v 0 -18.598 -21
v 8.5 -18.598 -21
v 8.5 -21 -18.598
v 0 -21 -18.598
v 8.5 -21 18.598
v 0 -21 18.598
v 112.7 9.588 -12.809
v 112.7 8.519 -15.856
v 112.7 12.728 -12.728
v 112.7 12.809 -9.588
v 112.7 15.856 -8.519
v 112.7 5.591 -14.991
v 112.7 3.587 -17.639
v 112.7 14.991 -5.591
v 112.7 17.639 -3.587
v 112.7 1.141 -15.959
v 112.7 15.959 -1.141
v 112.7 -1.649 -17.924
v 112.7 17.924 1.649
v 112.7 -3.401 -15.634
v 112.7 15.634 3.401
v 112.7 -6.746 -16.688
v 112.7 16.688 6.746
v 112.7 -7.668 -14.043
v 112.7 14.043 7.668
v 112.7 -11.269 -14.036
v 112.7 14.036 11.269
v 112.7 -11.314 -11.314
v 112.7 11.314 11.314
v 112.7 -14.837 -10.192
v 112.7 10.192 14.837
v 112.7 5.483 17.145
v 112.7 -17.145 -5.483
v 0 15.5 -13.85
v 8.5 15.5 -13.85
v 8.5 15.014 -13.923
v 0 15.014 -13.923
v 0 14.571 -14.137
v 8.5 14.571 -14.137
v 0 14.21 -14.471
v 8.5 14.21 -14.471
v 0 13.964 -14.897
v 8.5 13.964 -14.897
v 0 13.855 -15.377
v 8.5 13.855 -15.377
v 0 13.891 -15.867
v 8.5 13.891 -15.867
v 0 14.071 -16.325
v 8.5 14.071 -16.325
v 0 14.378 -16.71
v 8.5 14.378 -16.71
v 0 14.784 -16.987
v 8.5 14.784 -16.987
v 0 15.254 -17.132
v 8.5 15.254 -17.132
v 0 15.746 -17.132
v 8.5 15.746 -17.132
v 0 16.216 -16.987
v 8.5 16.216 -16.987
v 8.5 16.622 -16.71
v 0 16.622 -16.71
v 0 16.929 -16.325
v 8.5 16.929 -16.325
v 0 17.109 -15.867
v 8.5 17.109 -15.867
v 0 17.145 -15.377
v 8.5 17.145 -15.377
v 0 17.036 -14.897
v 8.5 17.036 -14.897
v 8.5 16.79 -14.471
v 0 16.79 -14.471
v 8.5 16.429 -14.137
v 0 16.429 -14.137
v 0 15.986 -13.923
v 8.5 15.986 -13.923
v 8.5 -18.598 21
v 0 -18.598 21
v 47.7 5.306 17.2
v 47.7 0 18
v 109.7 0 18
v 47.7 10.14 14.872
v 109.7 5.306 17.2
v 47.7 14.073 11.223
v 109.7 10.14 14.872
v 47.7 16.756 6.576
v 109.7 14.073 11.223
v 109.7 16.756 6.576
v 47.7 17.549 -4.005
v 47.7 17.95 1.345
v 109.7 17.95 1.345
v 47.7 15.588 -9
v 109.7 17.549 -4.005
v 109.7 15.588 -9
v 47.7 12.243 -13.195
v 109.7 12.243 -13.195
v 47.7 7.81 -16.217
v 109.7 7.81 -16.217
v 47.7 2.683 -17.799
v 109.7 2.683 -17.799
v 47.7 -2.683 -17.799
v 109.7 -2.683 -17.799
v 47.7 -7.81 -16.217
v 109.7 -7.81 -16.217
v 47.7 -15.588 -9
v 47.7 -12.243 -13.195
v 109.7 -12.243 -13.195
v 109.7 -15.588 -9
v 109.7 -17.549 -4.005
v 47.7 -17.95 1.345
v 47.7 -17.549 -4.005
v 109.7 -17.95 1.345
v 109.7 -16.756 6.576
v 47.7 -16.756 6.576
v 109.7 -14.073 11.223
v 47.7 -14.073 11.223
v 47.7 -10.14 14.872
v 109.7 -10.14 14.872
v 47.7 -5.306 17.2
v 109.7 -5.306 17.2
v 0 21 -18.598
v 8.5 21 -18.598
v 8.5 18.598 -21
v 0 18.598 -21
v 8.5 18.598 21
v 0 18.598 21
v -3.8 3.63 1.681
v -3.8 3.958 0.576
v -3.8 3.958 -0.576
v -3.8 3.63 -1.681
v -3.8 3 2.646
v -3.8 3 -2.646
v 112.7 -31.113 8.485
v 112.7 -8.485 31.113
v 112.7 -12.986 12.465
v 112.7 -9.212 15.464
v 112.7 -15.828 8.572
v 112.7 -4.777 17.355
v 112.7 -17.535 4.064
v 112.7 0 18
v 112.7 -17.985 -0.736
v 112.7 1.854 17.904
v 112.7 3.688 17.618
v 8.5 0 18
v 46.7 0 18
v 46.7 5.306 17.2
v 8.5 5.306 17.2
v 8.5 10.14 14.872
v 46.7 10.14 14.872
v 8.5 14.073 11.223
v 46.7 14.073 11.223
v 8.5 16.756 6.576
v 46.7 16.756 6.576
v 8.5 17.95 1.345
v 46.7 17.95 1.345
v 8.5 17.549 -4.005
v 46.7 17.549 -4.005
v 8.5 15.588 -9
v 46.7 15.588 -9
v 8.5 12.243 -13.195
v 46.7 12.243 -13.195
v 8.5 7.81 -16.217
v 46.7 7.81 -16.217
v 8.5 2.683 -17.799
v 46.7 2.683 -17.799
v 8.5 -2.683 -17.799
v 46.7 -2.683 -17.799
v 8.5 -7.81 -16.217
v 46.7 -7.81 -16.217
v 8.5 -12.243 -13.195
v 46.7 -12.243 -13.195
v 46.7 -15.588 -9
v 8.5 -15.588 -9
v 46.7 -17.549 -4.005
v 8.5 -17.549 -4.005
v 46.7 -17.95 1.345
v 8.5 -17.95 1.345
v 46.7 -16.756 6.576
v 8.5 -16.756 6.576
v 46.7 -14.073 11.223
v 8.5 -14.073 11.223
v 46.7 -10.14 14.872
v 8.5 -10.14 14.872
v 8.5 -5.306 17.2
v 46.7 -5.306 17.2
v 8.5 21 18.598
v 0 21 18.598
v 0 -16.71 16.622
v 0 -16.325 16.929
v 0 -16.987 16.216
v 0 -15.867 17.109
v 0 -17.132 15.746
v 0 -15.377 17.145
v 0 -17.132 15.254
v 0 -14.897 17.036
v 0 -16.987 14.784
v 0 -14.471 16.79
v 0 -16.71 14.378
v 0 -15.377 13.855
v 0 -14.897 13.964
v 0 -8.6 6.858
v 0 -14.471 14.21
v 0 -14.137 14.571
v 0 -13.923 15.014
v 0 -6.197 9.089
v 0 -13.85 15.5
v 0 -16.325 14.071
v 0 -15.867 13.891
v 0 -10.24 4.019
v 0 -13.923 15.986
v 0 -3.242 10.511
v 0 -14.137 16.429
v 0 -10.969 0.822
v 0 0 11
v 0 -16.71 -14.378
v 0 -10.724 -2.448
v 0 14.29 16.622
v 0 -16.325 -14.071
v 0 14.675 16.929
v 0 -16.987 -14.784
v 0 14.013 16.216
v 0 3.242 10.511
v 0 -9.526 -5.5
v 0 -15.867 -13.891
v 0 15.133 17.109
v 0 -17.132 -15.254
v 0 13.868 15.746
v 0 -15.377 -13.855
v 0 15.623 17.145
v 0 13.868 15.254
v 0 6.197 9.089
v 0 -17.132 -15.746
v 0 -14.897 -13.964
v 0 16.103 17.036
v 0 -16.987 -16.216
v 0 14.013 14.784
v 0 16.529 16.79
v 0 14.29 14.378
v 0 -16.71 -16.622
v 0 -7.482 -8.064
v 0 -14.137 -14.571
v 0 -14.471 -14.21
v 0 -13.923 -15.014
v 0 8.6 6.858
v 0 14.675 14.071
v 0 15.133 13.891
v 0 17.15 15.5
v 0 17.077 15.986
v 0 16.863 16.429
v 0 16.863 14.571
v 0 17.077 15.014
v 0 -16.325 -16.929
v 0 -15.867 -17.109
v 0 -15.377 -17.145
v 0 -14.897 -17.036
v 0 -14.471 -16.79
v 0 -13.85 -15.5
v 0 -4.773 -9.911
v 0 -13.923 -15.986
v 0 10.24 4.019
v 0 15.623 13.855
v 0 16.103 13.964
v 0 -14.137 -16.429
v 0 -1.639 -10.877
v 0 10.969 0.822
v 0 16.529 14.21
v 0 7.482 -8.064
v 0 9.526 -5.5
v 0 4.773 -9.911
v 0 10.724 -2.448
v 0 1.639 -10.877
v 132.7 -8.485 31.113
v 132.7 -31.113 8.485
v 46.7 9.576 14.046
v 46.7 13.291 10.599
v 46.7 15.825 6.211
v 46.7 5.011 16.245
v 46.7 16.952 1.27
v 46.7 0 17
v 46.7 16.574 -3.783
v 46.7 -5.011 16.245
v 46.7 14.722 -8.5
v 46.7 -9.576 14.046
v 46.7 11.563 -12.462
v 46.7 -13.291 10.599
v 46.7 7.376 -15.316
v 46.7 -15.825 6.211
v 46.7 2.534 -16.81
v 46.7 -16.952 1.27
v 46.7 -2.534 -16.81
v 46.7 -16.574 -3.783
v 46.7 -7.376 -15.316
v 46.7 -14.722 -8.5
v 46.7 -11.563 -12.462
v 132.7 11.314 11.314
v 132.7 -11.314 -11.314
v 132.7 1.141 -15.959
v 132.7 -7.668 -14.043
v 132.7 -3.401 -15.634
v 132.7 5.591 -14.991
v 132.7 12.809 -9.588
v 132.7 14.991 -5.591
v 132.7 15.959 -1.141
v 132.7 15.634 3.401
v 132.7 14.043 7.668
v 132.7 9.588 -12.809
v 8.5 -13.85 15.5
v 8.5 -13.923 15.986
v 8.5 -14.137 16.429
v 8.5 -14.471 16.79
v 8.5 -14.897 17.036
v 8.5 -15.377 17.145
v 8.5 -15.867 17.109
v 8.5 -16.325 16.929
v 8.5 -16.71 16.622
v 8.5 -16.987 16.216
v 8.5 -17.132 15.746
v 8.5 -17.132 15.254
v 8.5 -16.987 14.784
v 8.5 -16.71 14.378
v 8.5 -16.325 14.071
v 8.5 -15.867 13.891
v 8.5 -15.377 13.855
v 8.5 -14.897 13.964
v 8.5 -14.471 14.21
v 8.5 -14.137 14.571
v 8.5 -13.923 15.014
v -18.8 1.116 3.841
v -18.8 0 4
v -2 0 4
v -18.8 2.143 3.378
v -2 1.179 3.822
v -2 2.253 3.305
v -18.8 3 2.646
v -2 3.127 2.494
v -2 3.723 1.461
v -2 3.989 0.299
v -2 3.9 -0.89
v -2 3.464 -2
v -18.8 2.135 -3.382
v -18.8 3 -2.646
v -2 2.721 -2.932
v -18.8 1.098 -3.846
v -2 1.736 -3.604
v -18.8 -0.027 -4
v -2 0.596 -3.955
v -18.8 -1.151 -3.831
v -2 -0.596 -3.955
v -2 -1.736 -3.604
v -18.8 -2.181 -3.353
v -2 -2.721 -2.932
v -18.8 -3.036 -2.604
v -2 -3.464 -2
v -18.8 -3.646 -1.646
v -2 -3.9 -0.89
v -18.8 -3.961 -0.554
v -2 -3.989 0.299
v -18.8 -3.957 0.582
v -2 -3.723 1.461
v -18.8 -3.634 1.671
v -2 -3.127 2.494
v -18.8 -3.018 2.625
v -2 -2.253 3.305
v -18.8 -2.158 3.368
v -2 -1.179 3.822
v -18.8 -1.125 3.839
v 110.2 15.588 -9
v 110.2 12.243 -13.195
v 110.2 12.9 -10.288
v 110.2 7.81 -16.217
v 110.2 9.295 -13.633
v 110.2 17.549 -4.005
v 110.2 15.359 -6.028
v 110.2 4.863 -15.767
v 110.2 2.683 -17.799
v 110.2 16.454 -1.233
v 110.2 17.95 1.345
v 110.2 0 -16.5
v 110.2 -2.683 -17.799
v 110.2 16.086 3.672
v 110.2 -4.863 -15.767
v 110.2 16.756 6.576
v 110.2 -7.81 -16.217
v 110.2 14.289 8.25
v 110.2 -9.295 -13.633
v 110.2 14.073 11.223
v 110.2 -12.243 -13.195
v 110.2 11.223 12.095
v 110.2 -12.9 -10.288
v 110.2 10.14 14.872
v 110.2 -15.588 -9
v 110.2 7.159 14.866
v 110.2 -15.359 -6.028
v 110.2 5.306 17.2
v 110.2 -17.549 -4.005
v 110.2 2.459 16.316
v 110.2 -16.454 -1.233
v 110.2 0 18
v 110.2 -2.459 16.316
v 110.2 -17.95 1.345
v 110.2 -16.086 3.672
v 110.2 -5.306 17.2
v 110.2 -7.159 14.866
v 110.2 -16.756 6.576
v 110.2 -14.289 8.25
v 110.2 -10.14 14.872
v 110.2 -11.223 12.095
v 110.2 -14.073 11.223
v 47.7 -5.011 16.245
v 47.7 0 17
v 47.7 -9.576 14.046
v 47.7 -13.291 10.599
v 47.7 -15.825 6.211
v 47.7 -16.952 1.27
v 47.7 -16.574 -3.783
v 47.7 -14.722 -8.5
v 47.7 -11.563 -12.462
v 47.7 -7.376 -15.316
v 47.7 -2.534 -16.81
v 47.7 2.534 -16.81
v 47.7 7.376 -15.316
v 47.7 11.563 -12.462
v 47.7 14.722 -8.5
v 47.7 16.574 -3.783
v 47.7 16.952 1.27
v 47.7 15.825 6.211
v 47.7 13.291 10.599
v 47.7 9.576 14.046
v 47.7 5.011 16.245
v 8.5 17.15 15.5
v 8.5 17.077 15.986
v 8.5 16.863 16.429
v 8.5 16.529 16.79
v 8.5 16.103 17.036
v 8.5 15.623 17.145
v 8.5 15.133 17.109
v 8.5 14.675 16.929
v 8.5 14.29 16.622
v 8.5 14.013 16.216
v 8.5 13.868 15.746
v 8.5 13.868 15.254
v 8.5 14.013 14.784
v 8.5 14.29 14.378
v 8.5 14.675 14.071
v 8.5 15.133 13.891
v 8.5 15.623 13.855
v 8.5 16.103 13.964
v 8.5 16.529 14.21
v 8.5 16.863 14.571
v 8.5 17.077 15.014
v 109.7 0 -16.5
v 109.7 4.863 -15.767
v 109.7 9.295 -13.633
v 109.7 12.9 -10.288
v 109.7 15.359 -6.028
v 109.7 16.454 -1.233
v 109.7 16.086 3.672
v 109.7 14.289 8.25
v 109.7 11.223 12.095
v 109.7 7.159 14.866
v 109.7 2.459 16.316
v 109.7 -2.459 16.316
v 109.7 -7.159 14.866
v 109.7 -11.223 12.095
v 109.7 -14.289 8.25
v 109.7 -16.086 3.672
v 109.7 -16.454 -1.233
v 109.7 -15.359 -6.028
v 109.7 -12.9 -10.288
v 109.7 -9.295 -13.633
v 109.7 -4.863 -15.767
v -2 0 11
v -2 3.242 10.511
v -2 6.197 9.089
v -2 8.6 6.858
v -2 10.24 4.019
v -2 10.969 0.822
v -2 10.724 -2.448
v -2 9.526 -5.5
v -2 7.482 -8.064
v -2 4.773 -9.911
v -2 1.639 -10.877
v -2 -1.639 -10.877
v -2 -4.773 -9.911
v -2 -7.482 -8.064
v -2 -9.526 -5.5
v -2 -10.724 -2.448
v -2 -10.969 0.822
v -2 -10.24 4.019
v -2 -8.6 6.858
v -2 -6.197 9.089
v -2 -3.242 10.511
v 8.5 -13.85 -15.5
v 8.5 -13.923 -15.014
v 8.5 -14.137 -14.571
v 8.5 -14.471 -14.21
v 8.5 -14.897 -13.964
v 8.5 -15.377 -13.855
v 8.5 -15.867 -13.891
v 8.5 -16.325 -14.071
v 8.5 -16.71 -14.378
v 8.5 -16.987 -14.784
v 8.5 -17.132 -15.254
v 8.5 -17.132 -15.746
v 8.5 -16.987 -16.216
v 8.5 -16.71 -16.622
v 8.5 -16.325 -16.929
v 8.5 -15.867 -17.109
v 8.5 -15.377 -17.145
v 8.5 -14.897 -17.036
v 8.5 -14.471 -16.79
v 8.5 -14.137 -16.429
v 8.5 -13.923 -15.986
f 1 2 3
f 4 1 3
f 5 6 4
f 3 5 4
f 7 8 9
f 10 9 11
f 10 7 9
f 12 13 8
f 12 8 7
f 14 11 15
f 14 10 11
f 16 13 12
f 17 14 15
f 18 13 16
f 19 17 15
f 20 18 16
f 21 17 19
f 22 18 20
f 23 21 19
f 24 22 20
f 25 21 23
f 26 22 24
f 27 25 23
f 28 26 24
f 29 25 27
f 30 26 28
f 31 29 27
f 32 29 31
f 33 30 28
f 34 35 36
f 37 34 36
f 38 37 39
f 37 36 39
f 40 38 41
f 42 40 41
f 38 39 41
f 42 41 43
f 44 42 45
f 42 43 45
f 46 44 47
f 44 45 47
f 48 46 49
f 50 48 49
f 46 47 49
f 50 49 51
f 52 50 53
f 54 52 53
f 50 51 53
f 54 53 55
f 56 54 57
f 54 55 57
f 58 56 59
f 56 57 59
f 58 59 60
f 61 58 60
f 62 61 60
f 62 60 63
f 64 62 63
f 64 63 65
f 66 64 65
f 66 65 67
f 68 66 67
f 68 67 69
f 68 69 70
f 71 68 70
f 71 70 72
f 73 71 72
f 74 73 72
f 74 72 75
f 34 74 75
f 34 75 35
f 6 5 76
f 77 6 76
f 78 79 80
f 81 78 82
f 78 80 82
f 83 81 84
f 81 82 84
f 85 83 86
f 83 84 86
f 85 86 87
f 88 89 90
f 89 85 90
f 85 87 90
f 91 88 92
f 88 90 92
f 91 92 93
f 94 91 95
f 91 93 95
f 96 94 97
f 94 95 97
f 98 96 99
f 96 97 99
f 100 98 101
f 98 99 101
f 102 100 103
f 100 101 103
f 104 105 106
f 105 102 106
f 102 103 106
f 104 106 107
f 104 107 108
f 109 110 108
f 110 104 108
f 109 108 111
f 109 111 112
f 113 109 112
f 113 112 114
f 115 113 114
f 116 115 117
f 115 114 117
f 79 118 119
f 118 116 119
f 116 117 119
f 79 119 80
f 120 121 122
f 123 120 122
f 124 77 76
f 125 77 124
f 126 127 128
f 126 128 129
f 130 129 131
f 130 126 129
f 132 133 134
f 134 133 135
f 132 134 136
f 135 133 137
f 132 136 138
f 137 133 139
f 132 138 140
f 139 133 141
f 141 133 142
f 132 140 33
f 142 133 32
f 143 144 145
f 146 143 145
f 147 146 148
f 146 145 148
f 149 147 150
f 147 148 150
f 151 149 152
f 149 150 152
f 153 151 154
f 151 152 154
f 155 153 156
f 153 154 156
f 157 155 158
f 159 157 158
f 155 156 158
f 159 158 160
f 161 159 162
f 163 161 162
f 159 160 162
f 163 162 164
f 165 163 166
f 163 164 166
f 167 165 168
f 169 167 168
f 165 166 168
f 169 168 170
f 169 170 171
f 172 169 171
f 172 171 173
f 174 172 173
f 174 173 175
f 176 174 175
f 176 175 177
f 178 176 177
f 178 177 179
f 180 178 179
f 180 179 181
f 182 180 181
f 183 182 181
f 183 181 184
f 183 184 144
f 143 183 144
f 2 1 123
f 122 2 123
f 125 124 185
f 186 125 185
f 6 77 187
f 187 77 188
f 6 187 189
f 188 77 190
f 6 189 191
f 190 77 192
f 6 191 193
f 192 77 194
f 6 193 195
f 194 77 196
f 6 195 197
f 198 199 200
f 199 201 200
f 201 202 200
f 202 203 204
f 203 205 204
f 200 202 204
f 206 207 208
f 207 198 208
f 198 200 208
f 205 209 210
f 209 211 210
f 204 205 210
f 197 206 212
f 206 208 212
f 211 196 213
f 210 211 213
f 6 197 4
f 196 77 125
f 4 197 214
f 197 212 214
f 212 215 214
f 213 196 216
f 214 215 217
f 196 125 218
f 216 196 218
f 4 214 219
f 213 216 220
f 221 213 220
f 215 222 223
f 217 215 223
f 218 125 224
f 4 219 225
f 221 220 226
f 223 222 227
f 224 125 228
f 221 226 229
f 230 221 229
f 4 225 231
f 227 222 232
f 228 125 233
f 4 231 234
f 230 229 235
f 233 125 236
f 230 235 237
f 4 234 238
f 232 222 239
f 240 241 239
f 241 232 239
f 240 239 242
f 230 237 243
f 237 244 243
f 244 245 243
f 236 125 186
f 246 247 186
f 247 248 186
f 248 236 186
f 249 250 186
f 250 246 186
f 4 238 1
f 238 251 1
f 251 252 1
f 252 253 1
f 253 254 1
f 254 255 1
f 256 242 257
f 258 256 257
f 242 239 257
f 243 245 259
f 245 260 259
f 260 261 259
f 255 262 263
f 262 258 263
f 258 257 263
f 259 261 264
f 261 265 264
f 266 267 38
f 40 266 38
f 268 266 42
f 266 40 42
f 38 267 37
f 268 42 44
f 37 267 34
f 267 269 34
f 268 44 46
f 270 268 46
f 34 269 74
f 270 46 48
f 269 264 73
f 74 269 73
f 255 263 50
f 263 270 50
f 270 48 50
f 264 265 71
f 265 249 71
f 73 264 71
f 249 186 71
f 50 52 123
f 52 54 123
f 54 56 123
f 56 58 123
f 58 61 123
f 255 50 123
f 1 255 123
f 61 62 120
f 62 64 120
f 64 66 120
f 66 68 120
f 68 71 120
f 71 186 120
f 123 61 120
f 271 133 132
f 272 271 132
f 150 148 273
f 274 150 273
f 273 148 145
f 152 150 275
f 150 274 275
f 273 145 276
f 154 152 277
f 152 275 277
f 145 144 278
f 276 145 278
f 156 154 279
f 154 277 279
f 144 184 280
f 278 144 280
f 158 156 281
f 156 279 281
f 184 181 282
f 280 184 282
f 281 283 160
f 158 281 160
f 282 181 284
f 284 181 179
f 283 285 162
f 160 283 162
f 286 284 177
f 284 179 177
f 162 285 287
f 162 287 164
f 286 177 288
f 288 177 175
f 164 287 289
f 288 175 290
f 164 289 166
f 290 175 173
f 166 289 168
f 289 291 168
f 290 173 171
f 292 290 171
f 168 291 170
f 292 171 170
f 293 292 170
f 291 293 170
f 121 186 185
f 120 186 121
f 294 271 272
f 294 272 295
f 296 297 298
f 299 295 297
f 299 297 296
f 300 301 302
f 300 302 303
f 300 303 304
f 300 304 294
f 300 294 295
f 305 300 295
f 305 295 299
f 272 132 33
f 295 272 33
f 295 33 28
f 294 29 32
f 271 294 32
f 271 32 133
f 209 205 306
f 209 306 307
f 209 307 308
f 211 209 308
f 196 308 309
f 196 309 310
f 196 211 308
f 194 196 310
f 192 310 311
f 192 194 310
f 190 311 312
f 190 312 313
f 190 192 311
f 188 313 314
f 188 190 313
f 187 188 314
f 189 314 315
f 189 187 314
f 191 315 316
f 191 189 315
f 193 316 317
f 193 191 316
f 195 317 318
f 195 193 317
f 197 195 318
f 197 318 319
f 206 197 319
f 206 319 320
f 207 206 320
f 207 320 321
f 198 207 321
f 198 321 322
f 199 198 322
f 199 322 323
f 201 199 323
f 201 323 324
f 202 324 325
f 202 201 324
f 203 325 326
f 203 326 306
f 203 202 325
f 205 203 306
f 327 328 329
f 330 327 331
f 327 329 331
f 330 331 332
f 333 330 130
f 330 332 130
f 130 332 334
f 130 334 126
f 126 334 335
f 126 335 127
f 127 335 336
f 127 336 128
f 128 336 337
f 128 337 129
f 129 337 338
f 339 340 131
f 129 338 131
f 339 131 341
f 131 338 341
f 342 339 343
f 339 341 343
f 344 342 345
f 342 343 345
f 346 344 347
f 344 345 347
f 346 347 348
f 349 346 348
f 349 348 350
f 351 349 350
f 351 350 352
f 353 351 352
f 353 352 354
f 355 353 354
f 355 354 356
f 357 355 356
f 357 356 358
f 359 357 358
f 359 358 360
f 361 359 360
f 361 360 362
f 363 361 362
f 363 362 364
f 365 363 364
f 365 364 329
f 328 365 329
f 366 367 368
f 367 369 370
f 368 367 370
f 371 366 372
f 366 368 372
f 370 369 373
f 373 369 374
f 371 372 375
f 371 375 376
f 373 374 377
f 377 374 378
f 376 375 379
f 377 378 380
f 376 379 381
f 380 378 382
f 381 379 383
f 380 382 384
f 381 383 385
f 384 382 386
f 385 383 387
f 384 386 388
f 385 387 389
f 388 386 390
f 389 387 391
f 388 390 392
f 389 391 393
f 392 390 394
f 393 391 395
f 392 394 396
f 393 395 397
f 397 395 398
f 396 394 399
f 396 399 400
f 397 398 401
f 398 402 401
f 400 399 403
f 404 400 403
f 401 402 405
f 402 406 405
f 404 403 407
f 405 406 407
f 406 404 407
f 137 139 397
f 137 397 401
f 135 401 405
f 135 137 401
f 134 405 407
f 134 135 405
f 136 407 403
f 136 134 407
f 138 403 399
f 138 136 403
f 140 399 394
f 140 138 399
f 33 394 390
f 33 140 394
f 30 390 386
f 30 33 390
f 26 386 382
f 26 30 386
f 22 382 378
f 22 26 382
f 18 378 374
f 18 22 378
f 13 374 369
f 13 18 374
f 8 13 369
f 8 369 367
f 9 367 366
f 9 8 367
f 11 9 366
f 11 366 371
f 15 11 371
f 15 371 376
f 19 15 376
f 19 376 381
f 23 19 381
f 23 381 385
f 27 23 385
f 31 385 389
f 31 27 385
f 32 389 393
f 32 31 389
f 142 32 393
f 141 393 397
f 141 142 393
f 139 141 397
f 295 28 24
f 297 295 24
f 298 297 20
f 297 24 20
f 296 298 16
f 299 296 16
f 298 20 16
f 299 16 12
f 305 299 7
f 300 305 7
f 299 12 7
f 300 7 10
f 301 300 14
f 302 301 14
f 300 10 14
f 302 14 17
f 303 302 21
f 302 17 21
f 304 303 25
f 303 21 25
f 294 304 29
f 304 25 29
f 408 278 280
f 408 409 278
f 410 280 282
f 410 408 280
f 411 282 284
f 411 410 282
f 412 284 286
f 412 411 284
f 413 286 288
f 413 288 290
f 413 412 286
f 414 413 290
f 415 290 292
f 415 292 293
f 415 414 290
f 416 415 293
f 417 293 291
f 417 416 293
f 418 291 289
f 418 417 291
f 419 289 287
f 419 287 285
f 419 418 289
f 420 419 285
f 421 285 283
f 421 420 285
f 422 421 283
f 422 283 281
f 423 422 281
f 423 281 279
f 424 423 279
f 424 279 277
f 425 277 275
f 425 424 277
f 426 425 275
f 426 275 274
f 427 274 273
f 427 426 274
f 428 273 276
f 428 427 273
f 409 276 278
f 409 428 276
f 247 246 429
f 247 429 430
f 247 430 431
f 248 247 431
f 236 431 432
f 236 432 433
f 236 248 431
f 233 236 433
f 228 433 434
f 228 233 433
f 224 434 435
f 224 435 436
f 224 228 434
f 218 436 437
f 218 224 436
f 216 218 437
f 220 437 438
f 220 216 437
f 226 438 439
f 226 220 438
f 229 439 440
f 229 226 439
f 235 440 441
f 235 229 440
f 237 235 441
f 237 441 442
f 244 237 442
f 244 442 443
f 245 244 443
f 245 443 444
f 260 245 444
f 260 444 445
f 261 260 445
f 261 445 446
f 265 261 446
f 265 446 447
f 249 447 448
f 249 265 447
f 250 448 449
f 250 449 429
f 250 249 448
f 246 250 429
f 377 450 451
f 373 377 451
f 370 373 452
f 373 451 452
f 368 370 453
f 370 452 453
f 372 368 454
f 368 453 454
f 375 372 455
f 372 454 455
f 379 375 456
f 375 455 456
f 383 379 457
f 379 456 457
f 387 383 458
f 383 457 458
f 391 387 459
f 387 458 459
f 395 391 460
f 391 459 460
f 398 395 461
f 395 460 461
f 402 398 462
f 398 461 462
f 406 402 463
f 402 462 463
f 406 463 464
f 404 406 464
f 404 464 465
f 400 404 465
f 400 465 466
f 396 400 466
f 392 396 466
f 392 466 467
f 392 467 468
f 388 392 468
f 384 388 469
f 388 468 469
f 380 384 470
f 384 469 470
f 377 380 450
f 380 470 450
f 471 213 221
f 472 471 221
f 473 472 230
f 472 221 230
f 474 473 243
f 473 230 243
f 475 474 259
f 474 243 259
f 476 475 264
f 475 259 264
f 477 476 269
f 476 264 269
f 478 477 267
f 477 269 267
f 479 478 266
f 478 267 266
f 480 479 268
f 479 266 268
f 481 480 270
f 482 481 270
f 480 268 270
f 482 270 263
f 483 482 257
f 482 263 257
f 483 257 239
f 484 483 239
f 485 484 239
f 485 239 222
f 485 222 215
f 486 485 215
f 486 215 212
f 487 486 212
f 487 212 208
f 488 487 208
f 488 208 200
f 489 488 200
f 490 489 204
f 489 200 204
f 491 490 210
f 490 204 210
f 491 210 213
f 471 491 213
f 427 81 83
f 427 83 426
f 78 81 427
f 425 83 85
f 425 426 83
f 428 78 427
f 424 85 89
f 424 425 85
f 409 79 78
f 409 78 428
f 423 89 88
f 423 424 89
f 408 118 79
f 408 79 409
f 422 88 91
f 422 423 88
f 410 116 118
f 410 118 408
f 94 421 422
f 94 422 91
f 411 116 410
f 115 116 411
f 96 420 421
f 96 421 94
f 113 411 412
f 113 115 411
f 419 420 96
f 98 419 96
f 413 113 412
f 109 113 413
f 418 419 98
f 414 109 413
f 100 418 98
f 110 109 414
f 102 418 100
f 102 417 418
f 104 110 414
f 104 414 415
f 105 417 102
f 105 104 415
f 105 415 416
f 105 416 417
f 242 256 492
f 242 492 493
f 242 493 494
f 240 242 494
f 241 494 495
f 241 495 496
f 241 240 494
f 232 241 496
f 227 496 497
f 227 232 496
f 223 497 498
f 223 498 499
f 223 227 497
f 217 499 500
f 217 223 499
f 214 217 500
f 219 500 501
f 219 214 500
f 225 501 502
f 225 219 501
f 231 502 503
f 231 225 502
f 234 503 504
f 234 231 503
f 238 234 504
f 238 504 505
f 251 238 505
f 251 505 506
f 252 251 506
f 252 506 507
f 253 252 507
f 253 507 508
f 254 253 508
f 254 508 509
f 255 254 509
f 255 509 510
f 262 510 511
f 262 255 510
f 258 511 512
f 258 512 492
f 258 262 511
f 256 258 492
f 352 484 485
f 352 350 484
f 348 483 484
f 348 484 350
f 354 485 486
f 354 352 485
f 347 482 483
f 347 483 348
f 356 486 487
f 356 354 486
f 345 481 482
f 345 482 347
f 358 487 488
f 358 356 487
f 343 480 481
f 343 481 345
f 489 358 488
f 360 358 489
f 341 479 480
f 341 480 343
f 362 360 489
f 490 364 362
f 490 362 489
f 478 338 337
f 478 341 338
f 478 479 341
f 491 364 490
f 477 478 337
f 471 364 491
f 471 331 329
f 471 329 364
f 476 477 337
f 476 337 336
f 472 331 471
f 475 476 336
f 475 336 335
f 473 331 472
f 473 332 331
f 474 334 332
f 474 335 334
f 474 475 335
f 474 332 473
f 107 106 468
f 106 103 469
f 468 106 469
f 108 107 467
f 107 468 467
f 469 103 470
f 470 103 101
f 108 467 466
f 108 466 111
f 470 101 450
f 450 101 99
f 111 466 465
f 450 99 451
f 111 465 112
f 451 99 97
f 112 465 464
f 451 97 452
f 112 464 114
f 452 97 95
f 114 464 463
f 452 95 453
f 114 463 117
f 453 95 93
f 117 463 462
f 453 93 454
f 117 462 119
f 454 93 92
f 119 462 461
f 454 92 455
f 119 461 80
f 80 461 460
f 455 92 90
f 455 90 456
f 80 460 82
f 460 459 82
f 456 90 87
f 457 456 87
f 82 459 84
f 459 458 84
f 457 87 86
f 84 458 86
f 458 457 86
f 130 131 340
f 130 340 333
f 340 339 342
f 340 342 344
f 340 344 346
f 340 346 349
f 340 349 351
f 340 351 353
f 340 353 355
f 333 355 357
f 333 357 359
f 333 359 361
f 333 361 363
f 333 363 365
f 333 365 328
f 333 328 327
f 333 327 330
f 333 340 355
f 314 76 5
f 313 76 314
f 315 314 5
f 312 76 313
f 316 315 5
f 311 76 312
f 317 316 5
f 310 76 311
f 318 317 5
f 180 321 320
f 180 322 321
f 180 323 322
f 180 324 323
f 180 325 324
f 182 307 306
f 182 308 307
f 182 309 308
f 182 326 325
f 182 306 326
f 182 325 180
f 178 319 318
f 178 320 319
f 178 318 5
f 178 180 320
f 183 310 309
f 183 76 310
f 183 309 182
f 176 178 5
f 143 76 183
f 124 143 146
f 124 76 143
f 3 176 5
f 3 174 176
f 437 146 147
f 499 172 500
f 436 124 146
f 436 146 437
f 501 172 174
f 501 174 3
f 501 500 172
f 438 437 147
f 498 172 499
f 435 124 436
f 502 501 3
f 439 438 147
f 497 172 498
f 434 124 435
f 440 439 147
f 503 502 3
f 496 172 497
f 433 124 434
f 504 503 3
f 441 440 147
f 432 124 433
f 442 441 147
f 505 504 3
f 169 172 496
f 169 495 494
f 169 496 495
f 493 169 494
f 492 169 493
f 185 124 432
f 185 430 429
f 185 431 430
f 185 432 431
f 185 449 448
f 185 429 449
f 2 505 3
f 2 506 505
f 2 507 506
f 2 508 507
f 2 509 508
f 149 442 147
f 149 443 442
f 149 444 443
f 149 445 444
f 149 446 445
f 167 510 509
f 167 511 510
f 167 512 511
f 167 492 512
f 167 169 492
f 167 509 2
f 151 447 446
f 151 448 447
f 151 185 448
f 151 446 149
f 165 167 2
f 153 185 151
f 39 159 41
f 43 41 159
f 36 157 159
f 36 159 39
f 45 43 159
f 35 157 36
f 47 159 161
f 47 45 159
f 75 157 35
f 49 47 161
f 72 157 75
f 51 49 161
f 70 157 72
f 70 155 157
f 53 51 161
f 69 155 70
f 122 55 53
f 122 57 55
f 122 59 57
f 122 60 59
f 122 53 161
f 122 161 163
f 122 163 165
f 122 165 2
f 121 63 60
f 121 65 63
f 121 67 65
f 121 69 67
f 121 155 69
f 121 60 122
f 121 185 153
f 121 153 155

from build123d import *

# Parameters (mm, degrees)
SKETCH_1_W                 = 42
SKETCH_1_H                 = 42
EXTRUDE_1_DEPTH            = 8.5
SKETCH_2_R                 = 47.208301361
CUT_EXTRUDE_1_DEPTH        = 8.5
SKETCH_3_R                 = 11
EXTRUDE_2_DEPTH            = 2
SKETCH_4_R                 = 4
EXTRUDE_3_DEPTH            = 16.8
CUT_EXTRUDE_START          = -15
CUT_EXTRUDE_2_DEPTH        = 15
SKETCH_7_R                 = 18
EXTRUDE_4_DEPTH            = 101.2
SKETCH_8_R                 = 16.5
EXTRUDE_5_DEPTH            = 0.5
EXTRUDE_START              = 2.5
SKETCH_9_R                 = 18
EXTRUDE_6_DEPTH            = 2.5
EXTRUDE_7_DEPTH            = 20
HOLE_WIZARD_M4_1_D         = 3.3
PATTERN_LINEAR_1_OUTLINE_R = 1.65
PATTERN_LINEAR_1_DEPTH     = 8.5
SKETCH_13_W                = 1
SKETCH_13_H                = 1


# Read off the part's stored shape, not the designer's step: 阵列(线性)1
with BuildPart() as part:
    # 草图1 → 凸台-拉伸1 (new body)
    with BuildSketch(Plane(origin=(0, 0, 0), x_dir=(0, 0, -1), z_dir=(1, 0, 0))):
        Rectangle(SKETCH_1_W, SKETCH_1_H)
    extrude(amount=EXTRUDE_1_DEPTH)

    # 草图2 → 切除-拉伸1 (cut)
    with BuildSketch(Plane.ZY):
        Circle(SKETCH_2_R)
        Polygon((39.597979746, 0), (0, 39.597979746), (-39.597979746, 0), (0, -39.597979746), align=None, mode=Mode.SUBTRACT)
    extrude(amount=-CUT_EXTRUDE_1_DEPTH, mode=Mode.SUBTRACT)

    # 草图3 → 凸台-拉伸2 (add)
    with BuildSketch(Plane.ZY):
        Circle(SKETCH_3_R)
    extrude(amount=EXTRUDE_2_DEPTH)

    # 草图4 → 凸台-拉伸3 (add)
    with BuildSketch(Plane.ZY.offset(2)):
        Circle(SKETCH_4_R)
    extrude(amount=EXTRUDE_3_DEPTH)

    # 草图5 → 切除-拉伸2 (cut)
    with BuildSketch(Plane.ZY.offset(18.8).offset(CUT_EXTRUDE_START)):
        with BuildLine():
            Line((-2.645751311, 3), (2.645751311, 3))
            ThreePointArc((2.645751311, 3), (0, 4), (-2.645751311, 3))
        make_face()
    extrude(amount=CUT_EXTRUDE_2_DEPTH, mode=Mode.SUBTRACT)

    # 草图7 → 凸台-拉伸4 (add)
    with BuildSketch(Plane.ZY.offset(-109.7)):
        Circle(SKETCH_7_R)
    extrude(amount=EXTRUDE_4_DEPTH)

    # 草图8 → 凸台-拉伸5 (add)
    with BuildSketch(Plane(origin=(109.7, 0, 0), x_dir=(0, 0, -1), z_dir=(1, 0, 0))):
        Circle(SKETCH_8_R)
    extrude(amount=EXTRUDE_5_DEPTH)

    # 草图9 → 凸台-拉伸6 (add)
    with BuildSketch(Plane(origin=(110.2, 0, 0), x_dir=(0, 0, -1), z_dir=(1, 0, 0)).offset(EXTRUDE_START)):
        with Locations(Location((0, 0, 0), (0, 0, 180))):
            Circle(SKETCH_9_R)
    extrude(amount=-EXTRUDE_6_DEPTH)

    # 草图10 → 凸台-拉伸7 (add)
    with BuildSketch(Plane(origin=(112.7, 0, 0), x_dir=(0, 0, -1), z_dir=(1, 0, 0))):
        with BuildLine():
            Line((-11.313708499, 11.313708499), (-31.112698372, -8.485281374))
            Line((-31.112698372, -8.485281374), (-8.485281374, -31.112698372))
            Line((-8.485281374, -31.112698372), (11.313708499, -11.313708499))
            ThreePointArc((11.313708499, -11.313708499), (11.313708499, 11.313708499), (-11.313708499, 11.313708499))
        make_face()
    extrude(amount=EXTRUDE_7_DEPTH)

    # M4 螺纹孔1 (through all)
    with Locations(Plane(origin=(0, 15.5, -15.5), x_dir=(0, 0, -1), z_dir=(-1, 0, 0))):
        with Locations((0, 0)):
            Hole(HOLE_WIZARD_M4_1_D / 2)

    # 阵列(线性)1 outline → 阵列(线性)1 (cut)
    with BuildSketch(Plane.YZ):
        with Locations((-15.5, -15.5)):
            Circle(PATTERN_LINEAR_1_OUTLINE_R)
        with Locations((15.5, 15.5)):
            Circle(PATTERN_LINEAR_1_OUTLINE_R)
        with Locations((-15.5, 15.5)):
            Circle(PATTERN_LINEAR_1_OUTLINE_R)
    extrude(amount=PATTERN_LINEAR_1_DEPTH, mode=Mode.SUBTRACT)

    # 草图13 → 切除-旋转1 (revolve, cut)
    with BuildSketch(Plane(origin=(0, 0, 0), x_dir=(1, 0, 0), z_dir=(0, 1, 0)), mode=Mode.PRIVATE) as cut_revolve_1_sk:
        with Locations((47.2, 17.5)):
            Rectangle(SKETCH_13_W, SKETCH_13_H)
    revolve(cut_revolve_1_sk.sketch.rotate(Axis((8.5, 0, 0), (1, 0, 0)), 180), axis=Axis((8.5, 0, 0), (1, 0, 0)), mode=Mode.SUBTRACT)


solid = part.part
